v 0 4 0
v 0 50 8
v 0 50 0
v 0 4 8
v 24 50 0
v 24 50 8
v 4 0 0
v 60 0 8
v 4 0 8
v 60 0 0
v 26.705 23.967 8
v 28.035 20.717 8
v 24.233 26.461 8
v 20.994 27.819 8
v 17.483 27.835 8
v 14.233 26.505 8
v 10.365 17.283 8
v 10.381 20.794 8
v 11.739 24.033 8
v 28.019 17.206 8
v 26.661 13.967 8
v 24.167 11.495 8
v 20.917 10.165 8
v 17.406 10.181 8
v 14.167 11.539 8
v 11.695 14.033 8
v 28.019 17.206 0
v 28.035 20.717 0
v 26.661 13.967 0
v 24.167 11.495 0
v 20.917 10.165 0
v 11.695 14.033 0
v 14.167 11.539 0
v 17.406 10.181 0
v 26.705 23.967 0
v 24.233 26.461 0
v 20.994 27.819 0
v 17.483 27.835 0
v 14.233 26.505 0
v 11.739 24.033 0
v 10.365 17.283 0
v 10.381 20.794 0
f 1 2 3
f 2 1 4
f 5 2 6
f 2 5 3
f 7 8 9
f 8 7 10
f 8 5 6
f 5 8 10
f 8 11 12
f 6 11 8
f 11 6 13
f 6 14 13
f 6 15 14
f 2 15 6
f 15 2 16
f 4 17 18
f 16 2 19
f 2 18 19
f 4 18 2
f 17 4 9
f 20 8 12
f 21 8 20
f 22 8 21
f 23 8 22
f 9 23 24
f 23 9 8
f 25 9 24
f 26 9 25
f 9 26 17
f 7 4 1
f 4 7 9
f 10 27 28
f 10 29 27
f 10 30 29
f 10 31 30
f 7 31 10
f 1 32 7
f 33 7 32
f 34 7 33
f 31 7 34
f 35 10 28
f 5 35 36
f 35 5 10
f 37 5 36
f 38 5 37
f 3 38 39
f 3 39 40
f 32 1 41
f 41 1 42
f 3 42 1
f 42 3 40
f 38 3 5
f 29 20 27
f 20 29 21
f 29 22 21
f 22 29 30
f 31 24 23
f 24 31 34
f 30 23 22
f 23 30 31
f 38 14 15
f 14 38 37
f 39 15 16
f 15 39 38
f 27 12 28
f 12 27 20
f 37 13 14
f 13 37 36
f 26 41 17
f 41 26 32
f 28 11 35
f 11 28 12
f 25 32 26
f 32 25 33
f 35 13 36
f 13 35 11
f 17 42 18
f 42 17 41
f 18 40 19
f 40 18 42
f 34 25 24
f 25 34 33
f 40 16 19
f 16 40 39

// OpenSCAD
$fn = 32;

// ----------------------------------------------------------------------
// Bracket plate: gusset 60 x 50
// ----------------------------------------------------------------------

// --- parameters (mm) ---
hole_r = 3.5;             // bolt hole radius
plate_t = 8;              // plate thickness, Z (extrusion height)
gus_a = 60;               // base length
gus_b = 50;               // height
top_x = 24;               // top edge X of the angled cut
light_r = 9;              // lightening hole radius

light_d = 2 * light_r;

profile = [[4, 0], [30, 0], [60, 0], [24, 50], [0, 50], [0, 4]];  // primary outline, 6 points, counter clockwise
void_1 = [[28.035, 20.717], [26.705, 23.967], [24.233, 26.461], [20.994, 27.819], [17.483, 27.835], [14.233, 26.505], [11.739, 24.033], [10.381, 20.794], [10.365, 17.283], [11.695, 14.033], [14.167, 11.539], [17.406, 10.181], [20.917, 10.165], [24.167, 11.495], [26.661, 13.967], [28.019, 17.206]];  // lightening hole, 16 points

// --- the one profile operation ---
difference() {
  linear_extrude(height = plate_t) polygon(points = profile);
  translate([0, 0, -1])
    linear_extrude(height = plate_t + 2) polygon(points = void_1);
}
